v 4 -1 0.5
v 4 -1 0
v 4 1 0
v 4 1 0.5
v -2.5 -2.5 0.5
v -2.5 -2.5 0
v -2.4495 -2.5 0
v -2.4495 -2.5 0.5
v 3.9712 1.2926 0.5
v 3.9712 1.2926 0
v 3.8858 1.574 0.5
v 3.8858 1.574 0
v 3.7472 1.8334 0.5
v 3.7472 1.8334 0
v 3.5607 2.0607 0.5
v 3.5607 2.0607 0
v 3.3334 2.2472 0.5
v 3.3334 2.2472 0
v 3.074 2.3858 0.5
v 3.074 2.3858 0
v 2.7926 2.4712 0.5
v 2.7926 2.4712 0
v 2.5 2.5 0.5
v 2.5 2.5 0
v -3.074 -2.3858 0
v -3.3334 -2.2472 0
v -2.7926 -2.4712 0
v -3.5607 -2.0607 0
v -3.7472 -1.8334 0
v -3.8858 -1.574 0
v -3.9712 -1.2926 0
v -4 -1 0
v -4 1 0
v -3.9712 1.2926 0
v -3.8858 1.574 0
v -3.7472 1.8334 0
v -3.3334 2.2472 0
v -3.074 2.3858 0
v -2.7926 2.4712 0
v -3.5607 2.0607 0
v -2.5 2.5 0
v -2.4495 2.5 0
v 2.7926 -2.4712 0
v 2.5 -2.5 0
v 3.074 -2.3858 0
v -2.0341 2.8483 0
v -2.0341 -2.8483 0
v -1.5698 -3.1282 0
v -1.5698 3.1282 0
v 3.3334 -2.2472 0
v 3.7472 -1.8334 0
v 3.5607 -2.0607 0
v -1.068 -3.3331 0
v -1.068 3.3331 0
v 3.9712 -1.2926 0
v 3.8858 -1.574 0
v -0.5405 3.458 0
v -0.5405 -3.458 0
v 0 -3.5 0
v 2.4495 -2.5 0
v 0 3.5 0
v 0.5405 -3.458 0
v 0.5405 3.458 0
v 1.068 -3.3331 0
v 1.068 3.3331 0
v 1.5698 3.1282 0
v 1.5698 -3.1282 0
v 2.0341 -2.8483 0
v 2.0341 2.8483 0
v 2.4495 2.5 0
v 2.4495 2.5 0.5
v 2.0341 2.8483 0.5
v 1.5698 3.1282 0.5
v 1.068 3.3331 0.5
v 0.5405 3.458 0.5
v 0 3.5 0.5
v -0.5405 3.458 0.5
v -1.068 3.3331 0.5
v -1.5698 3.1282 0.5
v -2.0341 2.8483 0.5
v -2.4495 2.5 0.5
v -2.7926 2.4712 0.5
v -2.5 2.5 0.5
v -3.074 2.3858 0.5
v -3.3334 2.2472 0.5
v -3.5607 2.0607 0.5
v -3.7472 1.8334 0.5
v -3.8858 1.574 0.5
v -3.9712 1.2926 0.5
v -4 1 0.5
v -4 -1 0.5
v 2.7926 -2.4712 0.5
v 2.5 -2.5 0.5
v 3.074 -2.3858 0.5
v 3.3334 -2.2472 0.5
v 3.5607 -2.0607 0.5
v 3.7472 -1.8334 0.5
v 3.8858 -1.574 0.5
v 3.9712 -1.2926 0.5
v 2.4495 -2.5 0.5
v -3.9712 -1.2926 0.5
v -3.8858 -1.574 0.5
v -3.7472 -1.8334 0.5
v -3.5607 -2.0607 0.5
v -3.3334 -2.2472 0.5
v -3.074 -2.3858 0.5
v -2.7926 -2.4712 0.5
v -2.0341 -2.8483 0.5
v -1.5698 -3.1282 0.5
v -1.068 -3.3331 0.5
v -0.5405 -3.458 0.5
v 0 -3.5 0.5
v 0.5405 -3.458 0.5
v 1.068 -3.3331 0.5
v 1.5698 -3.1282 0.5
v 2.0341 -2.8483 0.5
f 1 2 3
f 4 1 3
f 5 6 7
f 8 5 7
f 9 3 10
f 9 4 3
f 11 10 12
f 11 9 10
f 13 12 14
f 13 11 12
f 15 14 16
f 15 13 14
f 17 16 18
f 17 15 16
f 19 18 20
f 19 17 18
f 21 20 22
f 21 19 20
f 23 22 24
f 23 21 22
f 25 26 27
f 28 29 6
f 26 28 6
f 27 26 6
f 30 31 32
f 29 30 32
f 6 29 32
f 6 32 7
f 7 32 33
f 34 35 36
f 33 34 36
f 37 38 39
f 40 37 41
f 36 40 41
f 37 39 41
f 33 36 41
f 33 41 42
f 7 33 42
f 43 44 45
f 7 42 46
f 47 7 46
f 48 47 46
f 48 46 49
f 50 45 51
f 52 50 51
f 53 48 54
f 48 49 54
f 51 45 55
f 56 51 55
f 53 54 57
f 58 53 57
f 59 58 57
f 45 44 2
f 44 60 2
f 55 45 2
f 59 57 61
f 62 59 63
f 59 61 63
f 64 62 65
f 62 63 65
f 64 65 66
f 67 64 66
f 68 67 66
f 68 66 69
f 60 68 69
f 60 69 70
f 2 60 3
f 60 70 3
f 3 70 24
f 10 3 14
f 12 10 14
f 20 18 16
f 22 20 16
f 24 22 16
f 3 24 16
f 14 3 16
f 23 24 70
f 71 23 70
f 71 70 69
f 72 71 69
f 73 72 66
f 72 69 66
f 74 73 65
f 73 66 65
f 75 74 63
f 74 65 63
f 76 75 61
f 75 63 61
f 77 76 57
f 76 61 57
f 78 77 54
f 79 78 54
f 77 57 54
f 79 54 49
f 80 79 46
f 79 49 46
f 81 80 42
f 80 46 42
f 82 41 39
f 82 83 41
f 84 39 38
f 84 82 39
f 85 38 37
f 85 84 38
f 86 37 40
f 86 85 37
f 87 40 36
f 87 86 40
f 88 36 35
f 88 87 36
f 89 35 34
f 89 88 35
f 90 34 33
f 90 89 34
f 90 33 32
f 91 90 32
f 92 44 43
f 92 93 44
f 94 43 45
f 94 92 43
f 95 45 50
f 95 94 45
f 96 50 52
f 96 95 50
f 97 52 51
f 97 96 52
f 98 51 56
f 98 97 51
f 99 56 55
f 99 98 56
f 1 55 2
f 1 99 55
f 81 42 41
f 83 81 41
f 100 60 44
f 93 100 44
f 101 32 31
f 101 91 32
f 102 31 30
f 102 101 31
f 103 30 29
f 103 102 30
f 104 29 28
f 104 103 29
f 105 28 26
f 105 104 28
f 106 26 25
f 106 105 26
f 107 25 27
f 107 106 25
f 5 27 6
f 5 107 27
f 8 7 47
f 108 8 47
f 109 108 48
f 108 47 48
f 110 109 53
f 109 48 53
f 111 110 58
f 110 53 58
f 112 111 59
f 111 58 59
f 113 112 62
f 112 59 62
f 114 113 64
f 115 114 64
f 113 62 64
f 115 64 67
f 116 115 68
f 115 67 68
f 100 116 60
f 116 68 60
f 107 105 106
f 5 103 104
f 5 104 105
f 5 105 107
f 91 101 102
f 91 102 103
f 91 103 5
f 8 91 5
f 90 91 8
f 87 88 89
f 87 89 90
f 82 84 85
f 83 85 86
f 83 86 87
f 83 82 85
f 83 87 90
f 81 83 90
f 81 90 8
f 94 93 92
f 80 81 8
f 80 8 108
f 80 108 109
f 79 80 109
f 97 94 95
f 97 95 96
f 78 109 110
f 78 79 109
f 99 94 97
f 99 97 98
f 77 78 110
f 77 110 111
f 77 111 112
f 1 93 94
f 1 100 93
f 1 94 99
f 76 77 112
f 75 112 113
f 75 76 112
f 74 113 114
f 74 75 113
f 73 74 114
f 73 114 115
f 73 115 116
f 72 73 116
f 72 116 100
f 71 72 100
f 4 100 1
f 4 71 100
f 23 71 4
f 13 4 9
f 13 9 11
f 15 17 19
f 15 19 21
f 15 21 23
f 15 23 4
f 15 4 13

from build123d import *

# Parameters (mm, degrees)
F1_DEPTH = 0.5
F2_R     = 1.5


with BuildPart() as f1:
    # F0 (on Top) → F1 (new body)
    with BuildSketch(Plane.XY):
        with BuildLine():
            Line((-2.4494897428, 2.5), (2.4494897428, 2.5))
            ThreePointArc((2.4494897428, 2.5), (0, 3.5), (-2.4494897428, 2.5))
        make_face()
        with BuildLine():
            ThreePointArc((2.4494897428, -2.5), (3.2267021942, -1.3558735008), (3.5, 0))
            ThreePointArc((3.5, 0), (3.2267021942, 1.3558735008), (2.4494897428, 2.5))
            Line((2.4494897428, 2.5), (-2.4494897428, 2.5))
            ThreePointArc((-2.4494897428, 2.5), (-3.5, 0), (-2.4494897428, -2.5))
            Line((-2.4494897428, -2.5), (2.4494897428, -2.5))
        make_face()
        with BuildLine():
            ThreePointArc((2.4494897428, 2.5), (3.2267021942, 1.3558735008), (3.5, 0))
            ThreePointArc((3.5, 0), (3.2267021942, -1.3558735008), (2.4494897428, -2.5))
            Line((2.4494897428, -2.5), (4, -2.5))
            Line((4, -2.5), (4, 2.5))
            Line((4, 2.5), (2.4494897428, 2.5))
        make_face()
        with BuildLine():
            ThreePointArc((-2.4494897428, -2.5), (0, -3.5), (2.4494897428, -2.5))
            Line((2.4494897428, -2.5), (-2.4494897428, -2.5))
        make_face()
        with BuildLine():
            ThreePointArc((-2.4494897428, -2.5), (-3.5, 0), (-2.4494897428, 2.5))
            Line((-2.4494897428, 2.5), (-4, 2.5))
            Line((-4, 2.5), (-4, -2.5))
            Line((-4, -2.5), (-2.4494897428, -2.5))
        make_face()
    extrude(amount=F1_DEPTH)

    # F2
    f2_edges = [f1.edges().sort_by_distance(p)[0] for p in [
        (-4, -2.5, 0.25),
        (-4, 2.5, 0.25),
        (4, -2.5, 0.25),
        (4, 2.5, 0.25),
    ]]
    fillet(f2_edges, radius=F2_R)


solid = f1.part
